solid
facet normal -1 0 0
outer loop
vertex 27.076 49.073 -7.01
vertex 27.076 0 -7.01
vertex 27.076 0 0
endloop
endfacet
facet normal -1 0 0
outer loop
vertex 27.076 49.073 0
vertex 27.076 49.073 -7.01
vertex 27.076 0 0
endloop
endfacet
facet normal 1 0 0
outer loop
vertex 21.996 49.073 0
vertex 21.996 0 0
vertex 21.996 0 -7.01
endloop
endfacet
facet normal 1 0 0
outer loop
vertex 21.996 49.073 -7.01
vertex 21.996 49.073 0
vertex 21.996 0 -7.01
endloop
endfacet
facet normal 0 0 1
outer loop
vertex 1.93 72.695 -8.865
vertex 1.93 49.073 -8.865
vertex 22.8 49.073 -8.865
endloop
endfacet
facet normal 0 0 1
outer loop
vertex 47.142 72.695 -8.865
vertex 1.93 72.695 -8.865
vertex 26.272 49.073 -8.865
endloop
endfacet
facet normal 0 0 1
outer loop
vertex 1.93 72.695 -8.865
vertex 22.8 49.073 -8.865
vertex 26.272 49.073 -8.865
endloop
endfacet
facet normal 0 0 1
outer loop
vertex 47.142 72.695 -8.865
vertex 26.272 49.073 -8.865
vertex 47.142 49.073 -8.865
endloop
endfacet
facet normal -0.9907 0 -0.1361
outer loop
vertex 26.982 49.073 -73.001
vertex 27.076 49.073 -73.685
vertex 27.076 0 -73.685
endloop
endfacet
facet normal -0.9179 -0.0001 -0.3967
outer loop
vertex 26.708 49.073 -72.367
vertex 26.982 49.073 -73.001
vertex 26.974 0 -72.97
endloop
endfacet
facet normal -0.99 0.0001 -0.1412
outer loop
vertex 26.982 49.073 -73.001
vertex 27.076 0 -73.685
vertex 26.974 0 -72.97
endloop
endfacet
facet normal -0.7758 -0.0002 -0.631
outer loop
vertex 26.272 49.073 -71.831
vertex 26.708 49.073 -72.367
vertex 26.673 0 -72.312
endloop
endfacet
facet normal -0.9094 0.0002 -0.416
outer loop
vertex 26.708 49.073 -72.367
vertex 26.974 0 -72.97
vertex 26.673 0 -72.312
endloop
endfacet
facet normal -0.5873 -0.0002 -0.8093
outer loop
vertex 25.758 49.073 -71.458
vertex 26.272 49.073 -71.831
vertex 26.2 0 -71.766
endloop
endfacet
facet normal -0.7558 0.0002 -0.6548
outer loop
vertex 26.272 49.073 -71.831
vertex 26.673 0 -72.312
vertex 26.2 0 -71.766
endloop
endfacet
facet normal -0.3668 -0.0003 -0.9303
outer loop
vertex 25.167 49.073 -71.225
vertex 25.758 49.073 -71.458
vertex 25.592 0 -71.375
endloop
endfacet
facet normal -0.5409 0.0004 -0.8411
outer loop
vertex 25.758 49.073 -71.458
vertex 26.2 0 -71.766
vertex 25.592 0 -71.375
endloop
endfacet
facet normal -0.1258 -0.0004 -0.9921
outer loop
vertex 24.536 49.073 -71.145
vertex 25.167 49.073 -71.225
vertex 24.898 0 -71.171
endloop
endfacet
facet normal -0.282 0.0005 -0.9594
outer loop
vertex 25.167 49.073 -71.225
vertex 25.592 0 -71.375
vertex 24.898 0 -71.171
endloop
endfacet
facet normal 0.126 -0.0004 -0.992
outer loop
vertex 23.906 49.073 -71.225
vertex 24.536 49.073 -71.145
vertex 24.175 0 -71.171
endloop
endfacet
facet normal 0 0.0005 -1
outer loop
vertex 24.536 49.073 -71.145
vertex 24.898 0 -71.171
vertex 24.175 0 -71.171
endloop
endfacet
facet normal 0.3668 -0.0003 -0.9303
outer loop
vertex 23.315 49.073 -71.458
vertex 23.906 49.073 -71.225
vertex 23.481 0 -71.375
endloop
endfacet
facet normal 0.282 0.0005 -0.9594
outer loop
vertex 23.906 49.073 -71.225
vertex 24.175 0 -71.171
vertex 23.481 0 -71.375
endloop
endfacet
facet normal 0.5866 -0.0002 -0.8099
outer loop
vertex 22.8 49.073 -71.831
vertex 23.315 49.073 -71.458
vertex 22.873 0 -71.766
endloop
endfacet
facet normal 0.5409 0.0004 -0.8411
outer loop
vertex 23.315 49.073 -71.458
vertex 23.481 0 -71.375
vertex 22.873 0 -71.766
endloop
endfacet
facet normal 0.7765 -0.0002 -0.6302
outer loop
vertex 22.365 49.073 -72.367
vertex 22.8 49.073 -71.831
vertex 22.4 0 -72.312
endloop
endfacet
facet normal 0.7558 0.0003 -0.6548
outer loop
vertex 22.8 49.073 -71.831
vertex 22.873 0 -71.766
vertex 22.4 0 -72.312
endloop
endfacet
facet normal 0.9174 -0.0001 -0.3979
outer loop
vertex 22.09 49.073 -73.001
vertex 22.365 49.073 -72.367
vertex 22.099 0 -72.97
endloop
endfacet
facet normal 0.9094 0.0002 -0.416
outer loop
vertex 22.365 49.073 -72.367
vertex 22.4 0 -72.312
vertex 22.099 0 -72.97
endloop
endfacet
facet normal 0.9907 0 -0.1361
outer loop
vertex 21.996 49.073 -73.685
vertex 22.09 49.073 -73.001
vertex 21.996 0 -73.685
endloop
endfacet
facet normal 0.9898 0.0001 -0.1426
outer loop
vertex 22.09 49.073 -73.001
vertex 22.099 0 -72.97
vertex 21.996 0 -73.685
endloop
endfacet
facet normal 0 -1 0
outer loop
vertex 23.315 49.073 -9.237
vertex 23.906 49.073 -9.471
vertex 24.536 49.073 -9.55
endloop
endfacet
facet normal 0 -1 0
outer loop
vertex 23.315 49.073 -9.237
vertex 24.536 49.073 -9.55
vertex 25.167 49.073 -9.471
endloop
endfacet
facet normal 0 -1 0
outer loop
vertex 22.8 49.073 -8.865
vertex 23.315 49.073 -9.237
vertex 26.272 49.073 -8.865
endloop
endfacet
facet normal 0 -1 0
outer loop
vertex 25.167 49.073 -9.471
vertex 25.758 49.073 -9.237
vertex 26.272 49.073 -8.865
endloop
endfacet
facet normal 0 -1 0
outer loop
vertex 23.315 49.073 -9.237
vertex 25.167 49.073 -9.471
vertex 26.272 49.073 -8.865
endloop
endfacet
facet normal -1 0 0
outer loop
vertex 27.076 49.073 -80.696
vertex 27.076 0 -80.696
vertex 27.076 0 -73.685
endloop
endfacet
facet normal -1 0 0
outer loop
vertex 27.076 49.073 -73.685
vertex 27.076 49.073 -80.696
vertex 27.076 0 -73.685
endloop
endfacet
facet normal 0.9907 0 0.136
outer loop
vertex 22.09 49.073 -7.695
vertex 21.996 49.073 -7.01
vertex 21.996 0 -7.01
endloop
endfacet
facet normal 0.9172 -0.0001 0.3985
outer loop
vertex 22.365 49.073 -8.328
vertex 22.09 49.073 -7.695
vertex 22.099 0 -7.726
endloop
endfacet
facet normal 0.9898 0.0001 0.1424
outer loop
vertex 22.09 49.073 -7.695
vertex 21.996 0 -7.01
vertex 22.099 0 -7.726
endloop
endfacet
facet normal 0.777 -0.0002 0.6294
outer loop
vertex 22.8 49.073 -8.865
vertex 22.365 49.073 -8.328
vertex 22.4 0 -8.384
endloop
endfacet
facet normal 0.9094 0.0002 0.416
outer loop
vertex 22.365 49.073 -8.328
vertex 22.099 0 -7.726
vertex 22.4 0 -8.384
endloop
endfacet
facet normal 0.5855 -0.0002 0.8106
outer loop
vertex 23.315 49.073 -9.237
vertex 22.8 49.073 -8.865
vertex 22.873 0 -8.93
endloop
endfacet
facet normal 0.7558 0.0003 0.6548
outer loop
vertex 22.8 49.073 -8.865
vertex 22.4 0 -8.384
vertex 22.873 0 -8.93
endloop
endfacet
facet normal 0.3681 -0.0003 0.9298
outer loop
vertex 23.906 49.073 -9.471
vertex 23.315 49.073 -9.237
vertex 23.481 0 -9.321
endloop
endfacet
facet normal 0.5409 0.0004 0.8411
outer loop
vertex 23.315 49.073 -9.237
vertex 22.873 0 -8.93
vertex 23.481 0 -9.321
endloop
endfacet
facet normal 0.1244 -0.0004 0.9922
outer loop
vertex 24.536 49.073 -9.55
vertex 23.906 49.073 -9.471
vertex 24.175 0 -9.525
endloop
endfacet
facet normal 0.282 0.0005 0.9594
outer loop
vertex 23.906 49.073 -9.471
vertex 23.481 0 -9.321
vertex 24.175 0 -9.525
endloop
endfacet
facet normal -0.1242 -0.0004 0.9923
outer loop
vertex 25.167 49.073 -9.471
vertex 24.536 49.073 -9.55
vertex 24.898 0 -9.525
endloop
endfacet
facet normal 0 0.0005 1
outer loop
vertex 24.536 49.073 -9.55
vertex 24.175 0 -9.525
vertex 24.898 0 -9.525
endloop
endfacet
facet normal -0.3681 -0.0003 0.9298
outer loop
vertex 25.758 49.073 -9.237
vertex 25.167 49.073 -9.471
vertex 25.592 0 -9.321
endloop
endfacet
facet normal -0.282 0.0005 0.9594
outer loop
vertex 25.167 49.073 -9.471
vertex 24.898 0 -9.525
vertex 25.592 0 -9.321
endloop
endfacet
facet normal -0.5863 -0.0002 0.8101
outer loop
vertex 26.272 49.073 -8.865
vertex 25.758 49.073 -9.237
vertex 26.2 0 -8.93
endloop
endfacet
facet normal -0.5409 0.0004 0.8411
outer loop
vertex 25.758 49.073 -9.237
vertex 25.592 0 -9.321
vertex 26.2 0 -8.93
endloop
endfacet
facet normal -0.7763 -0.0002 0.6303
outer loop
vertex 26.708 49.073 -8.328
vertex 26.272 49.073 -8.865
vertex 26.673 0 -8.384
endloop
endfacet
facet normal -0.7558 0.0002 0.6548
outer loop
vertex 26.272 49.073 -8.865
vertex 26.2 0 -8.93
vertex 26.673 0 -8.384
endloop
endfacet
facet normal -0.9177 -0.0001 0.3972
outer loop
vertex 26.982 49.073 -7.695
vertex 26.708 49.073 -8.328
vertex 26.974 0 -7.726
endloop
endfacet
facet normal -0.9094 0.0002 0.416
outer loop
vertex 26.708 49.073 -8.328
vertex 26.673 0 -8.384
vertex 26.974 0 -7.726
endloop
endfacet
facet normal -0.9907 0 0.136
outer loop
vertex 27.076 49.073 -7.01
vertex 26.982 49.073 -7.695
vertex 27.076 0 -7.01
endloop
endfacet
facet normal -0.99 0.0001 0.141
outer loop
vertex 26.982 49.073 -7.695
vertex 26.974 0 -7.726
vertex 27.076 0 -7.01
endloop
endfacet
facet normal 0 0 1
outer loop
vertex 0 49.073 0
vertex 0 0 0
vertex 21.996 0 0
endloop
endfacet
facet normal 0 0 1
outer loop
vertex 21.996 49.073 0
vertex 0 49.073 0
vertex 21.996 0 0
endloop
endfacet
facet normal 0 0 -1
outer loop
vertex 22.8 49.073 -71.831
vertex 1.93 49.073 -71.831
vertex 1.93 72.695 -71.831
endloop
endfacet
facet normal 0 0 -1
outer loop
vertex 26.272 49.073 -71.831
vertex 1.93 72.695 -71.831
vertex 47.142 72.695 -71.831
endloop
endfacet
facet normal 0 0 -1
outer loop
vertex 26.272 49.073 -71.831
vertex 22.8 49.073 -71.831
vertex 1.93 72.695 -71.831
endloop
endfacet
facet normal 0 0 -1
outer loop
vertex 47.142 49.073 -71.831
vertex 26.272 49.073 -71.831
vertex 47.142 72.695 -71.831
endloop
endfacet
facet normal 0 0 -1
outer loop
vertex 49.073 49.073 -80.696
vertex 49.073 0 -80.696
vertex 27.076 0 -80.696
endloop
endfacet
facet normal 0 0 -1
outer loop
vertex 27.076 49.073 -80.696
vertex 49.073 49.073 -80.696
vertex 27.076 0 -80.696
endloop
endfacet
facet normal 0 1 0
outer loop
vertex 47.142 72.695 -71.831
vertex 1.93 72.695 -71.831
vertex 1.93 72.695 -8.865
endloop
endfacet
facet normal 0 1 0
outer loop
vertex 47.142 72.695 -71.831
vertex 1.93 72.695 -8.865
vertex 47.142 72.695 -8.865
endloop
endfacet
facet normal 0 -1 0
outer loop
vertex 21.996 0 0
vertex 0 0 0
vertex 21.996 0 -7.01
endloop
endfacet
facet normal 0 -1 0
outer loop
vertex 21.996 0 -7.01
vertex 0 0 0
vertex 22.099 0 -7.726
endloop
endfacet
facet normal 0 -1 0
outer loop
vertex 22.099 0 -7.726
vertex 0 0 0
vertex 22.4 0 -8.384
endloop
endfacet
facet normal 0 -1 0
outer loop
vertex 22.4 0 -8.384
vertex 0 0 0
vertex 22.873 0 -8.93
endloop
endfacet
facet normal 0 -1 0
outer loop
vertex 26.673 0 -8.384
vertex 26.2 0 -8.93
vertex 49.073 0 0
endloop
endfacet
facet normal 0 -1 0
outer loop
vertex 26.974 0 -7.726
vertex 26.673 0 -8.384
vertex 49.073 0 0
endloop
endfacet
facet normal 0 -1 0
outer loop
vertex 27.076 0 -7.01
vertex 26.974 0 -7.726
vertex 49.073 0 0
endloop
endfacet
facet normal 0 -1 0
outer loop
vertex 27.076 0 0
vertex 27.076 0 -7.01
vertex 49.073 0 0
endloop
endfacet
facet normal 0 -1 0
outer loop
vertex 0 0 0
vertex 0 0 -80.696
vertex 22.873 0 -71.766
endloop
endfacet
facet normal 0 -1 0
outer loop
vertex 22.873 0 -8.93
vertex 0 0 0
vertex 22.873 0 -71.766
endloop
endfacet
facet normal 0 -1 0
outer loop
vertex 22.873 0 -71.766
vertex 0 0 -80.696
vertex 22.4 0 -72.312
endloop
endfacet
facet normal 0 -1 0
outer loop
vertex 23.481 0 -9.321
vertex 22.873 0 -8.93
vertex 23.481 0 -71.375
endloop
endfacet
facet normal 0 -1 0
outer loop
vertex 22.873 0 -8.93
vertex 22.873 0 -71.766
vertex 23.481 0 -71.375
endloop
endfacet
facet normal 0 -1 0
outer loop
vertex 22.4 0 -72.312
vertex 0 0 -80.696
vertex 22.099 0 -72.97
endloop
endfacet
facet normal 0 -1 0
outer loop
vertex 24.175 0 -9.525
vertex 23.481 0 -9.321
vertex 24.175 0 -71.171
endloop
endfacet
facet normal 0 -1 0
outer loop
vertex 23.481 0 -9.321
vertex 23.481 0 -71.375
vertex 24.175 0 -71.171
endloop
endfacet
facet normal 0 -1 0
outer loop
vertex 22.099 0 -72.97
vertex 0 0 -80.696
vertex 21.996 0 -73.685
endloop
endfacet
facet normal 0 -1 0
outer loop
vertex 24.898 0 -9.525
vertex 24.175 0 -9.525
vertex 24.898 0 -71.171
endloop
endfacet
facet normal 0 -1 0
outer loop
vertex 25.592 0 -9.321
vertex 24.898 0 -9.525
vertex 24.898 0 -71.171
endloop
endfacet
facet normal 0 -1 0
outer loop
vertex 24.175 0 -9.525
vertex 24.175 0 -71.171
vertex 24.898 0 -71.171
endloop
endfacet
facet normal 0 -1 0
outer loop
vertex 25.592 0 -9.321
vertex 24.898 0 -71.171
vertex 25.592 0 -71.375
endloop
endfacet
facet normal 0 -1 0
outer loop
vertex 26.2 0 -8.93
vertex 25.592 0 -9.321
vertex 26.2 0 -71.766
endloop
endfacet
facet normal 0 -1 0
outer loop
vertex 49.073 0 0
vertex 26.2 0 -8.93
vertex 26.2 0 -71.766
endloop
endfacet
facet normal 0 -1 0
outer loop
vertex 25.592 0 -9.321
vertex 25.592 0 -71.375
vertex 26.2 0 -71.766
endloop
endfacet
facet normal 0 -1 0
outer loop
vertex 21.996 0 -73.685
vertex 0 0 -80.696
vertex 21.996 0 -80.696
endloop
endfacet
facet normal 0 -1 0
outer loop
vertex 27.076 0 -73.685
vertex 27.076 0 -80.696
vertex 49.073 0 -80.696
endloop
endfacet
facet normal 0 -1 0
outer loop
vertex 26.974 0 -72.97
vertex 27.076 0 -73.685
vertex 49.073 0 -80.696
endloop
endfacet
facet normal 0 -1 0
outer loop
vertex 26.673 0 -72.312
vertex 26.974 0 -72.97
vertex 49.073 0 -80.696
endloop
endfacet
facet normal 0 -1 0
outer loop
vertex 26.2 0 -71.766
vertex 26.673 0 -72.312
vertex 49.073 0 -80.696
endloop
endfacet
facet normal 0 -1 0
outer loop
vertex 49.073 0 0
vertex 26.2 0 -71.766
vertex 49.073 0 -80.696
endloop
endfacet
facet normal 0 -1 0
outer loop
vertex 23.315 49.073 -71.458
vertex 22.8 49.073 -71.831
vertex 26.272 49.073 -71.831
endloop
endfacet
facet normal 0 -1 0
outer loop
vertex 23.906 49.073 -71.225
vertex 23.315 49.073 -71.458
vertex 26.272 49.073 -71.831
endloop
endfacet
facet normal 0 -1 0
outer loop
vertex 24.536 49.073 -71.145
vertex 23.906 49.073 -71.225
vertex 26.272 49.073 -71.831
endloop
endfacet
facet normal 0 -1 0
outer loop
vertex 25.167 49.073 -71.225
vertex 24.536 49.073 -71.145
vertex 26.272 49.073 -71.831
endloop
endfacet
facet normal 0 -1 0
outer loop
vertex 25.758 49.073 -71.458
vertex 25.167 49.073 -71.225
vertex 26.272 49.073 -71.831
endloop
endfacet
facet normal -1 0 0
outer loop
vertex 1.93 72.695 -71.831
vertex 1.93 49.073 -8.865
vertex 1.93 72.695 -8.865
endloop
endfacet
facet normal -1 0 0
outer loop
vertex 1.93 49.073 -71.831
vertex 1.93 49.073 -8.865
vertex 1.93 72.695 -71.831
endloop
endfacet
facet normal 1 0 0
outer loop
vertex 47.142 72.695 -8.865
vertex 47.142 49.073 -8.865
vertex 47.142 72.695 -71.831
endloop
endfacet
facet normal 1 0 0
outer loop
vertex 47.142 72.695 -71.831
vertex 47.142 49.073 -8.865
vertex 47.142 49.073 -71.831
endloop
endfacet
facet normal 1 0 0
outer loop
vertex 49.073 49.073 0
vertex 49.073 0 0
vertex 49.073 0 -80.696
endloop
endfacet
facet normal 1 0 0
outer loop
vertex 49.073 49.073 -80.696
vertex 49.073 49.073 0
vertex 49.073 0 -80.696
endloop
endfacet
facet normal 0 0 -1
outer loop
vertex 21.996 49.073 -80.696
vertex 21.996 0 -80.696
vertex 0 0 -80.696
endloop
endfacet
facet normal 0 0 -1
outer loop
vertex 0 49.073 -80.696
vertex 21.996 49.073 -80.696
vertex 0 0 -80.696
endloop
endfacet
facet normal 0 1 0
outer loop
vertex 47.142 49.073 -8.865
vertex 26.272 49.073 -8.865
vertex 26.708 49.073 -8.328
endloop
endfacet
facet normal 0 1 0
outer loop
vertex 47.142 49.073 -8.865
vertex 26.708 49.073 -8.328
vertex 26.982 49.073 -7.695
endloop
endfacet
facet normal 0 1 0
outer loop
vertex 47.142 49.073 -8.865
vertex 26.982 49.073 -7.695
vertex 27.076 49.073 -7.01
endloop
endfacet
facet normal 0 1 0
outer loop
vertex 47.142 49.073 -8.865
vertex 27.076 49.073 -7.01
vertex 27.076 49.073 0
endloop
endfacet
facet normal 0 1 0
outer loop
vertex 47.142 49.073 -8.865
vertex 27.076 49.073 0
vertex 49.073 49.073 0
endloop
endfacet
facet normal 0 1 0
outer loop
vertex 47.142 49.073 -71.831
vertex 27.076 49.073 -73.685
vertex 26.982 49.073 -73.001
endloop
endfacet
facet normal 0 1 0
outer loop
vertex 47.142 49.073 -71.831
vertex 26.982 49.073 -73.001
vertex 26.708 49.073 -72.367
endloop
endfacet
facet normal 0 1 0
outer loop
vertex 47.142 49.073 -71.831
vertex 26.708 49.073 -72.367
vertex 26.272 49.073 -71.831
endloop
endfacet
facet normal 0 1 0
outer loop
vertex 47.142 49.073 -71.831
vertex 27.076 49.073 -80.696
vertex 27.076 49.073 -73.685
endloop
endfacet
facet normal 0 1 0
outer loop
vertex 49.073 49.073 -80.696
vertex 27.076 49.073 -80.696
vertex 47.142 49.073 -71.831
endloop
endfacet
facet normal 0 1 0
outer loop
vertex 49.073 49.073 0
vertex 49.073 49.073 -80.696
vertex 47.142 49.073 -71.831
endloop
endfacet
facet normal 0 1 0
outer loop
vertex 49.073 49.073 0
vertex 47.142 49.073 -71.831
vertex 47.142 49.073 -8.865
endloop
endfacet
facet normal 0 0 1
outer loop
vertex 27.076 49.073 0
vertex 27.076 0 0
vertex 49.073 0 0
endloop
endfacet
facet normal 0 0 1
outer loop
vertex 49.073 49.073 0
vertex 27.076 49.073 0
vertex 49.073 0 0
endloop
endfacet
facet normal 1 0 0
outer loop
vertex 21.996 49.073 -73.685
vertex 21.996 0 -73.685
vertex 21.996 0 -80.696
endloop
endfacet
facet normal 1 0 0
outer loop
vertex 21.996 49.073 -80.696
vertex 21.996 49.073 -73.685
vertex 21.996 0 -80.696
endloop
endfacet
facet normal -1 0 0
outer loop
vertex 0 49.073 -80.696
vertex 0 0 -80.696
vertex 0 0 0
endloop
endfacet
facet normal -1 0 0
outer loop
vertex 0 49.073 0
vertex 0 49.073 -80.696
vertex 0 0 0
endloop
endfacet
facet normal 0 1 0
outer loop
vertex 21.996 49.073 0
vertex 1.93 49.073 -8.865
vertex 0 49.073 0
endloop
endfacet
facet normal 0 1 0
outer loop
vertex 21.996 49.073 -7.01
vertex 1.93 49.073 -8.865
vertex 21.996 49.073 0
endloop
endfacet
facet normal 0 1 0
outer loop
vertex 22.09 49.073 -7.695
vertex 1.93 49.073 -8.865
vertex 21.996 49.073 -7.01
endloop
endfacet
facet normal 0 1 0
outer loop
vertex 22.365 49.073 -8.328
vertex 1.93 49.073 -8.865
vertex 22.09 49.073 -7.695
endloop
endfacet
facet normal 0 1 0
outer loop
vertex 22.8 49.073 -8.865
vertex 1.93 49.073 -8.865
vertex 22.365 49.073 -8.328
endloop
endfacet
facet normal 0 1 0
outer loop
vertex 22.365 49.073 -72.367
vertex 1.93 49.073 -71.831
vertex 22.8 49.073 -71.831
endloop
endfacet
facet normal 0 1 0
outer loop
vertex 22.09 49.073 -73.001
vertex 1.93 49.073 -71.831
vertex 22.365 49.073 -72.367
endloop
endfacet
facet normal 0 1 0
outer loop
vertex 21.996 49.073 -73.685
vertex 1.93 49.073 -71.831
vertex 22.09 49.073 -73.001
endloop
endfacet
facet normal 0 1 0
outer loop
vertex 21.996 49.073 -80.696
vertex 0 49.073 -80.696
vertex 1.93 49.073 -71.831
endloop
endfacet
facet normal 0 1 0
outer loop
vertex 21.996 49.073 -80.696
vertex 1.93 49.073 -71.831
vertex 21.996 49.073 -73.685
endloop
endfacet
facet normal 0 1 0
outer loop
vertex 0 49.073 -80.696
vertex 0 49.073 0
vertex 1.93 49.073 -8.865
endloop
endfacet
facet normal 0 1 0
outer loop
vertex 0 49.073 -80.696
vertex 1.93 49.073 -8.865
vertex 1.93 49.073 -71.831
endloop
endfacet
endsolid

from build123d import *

# Parameters (mm, degrees)
BOSS_EXTRUDE1_DEPTH = 49.0728
SKETCH2_W           = 45.212
SKETCH2_H           = 62.9666
BOSS_EXTRUDE2_DEPTH = 23.622


with BuildPart() as part:
    # Sketch1 → Boss-Extrude1 (new body)
    with BuildSketch(Plane(origin=(0, 0, 0), x_dir=(1, 0, 0), z_dir=(0, 1, 0))):
        with BuildLine():
            Line((0, 80.6958), (0, 0))
            Line((0, 0), (21.9964, 0))
            Line((21.9964, 0), (21.9964, 7.0104))
            ThreePointArc((21.9964, 7.0104), (24.5364, 9.5504), (27.0764, 7.0104))
            Line((27.0764, 7.0104), (27.0764, 0))
            Line((27.0764, 0), (49.0728, 0))
            Line((49.0728, 0), (49.0728, 80.6958))
            Line((49.0728, 80.6958), (27.0764, 80.6958))
            Line((27.0764, 80.6958), (27.0764, 73.6854))
            ThreePointArc((27.0764, 73.6854), (24.5364, 71.1454), (21.9964, 73.6854))
            Line((21.9964, 73.6854), (21.9964, 80.6958))
            Line((21.9964, 80.6958), (0, 80.6958))
        make_face()
    extrude(amount=BOSS_EXTRUDE1_DEPTH)

    # Sketch2 → Boss-Extrude2 (add)
    with BuildSketch(Plane(origin=(0, 49.0728, 0), x_dir=(1, 0, 0), z_dir=(0, 1, 0))):
        with Locations((24.5364, 40.3479)):
            Rectangle(SKETCH2_W, SKETCH2_H)
    extrude(amount=BOSS_EXTRUDE2_DEPTH)


solid = part.part
